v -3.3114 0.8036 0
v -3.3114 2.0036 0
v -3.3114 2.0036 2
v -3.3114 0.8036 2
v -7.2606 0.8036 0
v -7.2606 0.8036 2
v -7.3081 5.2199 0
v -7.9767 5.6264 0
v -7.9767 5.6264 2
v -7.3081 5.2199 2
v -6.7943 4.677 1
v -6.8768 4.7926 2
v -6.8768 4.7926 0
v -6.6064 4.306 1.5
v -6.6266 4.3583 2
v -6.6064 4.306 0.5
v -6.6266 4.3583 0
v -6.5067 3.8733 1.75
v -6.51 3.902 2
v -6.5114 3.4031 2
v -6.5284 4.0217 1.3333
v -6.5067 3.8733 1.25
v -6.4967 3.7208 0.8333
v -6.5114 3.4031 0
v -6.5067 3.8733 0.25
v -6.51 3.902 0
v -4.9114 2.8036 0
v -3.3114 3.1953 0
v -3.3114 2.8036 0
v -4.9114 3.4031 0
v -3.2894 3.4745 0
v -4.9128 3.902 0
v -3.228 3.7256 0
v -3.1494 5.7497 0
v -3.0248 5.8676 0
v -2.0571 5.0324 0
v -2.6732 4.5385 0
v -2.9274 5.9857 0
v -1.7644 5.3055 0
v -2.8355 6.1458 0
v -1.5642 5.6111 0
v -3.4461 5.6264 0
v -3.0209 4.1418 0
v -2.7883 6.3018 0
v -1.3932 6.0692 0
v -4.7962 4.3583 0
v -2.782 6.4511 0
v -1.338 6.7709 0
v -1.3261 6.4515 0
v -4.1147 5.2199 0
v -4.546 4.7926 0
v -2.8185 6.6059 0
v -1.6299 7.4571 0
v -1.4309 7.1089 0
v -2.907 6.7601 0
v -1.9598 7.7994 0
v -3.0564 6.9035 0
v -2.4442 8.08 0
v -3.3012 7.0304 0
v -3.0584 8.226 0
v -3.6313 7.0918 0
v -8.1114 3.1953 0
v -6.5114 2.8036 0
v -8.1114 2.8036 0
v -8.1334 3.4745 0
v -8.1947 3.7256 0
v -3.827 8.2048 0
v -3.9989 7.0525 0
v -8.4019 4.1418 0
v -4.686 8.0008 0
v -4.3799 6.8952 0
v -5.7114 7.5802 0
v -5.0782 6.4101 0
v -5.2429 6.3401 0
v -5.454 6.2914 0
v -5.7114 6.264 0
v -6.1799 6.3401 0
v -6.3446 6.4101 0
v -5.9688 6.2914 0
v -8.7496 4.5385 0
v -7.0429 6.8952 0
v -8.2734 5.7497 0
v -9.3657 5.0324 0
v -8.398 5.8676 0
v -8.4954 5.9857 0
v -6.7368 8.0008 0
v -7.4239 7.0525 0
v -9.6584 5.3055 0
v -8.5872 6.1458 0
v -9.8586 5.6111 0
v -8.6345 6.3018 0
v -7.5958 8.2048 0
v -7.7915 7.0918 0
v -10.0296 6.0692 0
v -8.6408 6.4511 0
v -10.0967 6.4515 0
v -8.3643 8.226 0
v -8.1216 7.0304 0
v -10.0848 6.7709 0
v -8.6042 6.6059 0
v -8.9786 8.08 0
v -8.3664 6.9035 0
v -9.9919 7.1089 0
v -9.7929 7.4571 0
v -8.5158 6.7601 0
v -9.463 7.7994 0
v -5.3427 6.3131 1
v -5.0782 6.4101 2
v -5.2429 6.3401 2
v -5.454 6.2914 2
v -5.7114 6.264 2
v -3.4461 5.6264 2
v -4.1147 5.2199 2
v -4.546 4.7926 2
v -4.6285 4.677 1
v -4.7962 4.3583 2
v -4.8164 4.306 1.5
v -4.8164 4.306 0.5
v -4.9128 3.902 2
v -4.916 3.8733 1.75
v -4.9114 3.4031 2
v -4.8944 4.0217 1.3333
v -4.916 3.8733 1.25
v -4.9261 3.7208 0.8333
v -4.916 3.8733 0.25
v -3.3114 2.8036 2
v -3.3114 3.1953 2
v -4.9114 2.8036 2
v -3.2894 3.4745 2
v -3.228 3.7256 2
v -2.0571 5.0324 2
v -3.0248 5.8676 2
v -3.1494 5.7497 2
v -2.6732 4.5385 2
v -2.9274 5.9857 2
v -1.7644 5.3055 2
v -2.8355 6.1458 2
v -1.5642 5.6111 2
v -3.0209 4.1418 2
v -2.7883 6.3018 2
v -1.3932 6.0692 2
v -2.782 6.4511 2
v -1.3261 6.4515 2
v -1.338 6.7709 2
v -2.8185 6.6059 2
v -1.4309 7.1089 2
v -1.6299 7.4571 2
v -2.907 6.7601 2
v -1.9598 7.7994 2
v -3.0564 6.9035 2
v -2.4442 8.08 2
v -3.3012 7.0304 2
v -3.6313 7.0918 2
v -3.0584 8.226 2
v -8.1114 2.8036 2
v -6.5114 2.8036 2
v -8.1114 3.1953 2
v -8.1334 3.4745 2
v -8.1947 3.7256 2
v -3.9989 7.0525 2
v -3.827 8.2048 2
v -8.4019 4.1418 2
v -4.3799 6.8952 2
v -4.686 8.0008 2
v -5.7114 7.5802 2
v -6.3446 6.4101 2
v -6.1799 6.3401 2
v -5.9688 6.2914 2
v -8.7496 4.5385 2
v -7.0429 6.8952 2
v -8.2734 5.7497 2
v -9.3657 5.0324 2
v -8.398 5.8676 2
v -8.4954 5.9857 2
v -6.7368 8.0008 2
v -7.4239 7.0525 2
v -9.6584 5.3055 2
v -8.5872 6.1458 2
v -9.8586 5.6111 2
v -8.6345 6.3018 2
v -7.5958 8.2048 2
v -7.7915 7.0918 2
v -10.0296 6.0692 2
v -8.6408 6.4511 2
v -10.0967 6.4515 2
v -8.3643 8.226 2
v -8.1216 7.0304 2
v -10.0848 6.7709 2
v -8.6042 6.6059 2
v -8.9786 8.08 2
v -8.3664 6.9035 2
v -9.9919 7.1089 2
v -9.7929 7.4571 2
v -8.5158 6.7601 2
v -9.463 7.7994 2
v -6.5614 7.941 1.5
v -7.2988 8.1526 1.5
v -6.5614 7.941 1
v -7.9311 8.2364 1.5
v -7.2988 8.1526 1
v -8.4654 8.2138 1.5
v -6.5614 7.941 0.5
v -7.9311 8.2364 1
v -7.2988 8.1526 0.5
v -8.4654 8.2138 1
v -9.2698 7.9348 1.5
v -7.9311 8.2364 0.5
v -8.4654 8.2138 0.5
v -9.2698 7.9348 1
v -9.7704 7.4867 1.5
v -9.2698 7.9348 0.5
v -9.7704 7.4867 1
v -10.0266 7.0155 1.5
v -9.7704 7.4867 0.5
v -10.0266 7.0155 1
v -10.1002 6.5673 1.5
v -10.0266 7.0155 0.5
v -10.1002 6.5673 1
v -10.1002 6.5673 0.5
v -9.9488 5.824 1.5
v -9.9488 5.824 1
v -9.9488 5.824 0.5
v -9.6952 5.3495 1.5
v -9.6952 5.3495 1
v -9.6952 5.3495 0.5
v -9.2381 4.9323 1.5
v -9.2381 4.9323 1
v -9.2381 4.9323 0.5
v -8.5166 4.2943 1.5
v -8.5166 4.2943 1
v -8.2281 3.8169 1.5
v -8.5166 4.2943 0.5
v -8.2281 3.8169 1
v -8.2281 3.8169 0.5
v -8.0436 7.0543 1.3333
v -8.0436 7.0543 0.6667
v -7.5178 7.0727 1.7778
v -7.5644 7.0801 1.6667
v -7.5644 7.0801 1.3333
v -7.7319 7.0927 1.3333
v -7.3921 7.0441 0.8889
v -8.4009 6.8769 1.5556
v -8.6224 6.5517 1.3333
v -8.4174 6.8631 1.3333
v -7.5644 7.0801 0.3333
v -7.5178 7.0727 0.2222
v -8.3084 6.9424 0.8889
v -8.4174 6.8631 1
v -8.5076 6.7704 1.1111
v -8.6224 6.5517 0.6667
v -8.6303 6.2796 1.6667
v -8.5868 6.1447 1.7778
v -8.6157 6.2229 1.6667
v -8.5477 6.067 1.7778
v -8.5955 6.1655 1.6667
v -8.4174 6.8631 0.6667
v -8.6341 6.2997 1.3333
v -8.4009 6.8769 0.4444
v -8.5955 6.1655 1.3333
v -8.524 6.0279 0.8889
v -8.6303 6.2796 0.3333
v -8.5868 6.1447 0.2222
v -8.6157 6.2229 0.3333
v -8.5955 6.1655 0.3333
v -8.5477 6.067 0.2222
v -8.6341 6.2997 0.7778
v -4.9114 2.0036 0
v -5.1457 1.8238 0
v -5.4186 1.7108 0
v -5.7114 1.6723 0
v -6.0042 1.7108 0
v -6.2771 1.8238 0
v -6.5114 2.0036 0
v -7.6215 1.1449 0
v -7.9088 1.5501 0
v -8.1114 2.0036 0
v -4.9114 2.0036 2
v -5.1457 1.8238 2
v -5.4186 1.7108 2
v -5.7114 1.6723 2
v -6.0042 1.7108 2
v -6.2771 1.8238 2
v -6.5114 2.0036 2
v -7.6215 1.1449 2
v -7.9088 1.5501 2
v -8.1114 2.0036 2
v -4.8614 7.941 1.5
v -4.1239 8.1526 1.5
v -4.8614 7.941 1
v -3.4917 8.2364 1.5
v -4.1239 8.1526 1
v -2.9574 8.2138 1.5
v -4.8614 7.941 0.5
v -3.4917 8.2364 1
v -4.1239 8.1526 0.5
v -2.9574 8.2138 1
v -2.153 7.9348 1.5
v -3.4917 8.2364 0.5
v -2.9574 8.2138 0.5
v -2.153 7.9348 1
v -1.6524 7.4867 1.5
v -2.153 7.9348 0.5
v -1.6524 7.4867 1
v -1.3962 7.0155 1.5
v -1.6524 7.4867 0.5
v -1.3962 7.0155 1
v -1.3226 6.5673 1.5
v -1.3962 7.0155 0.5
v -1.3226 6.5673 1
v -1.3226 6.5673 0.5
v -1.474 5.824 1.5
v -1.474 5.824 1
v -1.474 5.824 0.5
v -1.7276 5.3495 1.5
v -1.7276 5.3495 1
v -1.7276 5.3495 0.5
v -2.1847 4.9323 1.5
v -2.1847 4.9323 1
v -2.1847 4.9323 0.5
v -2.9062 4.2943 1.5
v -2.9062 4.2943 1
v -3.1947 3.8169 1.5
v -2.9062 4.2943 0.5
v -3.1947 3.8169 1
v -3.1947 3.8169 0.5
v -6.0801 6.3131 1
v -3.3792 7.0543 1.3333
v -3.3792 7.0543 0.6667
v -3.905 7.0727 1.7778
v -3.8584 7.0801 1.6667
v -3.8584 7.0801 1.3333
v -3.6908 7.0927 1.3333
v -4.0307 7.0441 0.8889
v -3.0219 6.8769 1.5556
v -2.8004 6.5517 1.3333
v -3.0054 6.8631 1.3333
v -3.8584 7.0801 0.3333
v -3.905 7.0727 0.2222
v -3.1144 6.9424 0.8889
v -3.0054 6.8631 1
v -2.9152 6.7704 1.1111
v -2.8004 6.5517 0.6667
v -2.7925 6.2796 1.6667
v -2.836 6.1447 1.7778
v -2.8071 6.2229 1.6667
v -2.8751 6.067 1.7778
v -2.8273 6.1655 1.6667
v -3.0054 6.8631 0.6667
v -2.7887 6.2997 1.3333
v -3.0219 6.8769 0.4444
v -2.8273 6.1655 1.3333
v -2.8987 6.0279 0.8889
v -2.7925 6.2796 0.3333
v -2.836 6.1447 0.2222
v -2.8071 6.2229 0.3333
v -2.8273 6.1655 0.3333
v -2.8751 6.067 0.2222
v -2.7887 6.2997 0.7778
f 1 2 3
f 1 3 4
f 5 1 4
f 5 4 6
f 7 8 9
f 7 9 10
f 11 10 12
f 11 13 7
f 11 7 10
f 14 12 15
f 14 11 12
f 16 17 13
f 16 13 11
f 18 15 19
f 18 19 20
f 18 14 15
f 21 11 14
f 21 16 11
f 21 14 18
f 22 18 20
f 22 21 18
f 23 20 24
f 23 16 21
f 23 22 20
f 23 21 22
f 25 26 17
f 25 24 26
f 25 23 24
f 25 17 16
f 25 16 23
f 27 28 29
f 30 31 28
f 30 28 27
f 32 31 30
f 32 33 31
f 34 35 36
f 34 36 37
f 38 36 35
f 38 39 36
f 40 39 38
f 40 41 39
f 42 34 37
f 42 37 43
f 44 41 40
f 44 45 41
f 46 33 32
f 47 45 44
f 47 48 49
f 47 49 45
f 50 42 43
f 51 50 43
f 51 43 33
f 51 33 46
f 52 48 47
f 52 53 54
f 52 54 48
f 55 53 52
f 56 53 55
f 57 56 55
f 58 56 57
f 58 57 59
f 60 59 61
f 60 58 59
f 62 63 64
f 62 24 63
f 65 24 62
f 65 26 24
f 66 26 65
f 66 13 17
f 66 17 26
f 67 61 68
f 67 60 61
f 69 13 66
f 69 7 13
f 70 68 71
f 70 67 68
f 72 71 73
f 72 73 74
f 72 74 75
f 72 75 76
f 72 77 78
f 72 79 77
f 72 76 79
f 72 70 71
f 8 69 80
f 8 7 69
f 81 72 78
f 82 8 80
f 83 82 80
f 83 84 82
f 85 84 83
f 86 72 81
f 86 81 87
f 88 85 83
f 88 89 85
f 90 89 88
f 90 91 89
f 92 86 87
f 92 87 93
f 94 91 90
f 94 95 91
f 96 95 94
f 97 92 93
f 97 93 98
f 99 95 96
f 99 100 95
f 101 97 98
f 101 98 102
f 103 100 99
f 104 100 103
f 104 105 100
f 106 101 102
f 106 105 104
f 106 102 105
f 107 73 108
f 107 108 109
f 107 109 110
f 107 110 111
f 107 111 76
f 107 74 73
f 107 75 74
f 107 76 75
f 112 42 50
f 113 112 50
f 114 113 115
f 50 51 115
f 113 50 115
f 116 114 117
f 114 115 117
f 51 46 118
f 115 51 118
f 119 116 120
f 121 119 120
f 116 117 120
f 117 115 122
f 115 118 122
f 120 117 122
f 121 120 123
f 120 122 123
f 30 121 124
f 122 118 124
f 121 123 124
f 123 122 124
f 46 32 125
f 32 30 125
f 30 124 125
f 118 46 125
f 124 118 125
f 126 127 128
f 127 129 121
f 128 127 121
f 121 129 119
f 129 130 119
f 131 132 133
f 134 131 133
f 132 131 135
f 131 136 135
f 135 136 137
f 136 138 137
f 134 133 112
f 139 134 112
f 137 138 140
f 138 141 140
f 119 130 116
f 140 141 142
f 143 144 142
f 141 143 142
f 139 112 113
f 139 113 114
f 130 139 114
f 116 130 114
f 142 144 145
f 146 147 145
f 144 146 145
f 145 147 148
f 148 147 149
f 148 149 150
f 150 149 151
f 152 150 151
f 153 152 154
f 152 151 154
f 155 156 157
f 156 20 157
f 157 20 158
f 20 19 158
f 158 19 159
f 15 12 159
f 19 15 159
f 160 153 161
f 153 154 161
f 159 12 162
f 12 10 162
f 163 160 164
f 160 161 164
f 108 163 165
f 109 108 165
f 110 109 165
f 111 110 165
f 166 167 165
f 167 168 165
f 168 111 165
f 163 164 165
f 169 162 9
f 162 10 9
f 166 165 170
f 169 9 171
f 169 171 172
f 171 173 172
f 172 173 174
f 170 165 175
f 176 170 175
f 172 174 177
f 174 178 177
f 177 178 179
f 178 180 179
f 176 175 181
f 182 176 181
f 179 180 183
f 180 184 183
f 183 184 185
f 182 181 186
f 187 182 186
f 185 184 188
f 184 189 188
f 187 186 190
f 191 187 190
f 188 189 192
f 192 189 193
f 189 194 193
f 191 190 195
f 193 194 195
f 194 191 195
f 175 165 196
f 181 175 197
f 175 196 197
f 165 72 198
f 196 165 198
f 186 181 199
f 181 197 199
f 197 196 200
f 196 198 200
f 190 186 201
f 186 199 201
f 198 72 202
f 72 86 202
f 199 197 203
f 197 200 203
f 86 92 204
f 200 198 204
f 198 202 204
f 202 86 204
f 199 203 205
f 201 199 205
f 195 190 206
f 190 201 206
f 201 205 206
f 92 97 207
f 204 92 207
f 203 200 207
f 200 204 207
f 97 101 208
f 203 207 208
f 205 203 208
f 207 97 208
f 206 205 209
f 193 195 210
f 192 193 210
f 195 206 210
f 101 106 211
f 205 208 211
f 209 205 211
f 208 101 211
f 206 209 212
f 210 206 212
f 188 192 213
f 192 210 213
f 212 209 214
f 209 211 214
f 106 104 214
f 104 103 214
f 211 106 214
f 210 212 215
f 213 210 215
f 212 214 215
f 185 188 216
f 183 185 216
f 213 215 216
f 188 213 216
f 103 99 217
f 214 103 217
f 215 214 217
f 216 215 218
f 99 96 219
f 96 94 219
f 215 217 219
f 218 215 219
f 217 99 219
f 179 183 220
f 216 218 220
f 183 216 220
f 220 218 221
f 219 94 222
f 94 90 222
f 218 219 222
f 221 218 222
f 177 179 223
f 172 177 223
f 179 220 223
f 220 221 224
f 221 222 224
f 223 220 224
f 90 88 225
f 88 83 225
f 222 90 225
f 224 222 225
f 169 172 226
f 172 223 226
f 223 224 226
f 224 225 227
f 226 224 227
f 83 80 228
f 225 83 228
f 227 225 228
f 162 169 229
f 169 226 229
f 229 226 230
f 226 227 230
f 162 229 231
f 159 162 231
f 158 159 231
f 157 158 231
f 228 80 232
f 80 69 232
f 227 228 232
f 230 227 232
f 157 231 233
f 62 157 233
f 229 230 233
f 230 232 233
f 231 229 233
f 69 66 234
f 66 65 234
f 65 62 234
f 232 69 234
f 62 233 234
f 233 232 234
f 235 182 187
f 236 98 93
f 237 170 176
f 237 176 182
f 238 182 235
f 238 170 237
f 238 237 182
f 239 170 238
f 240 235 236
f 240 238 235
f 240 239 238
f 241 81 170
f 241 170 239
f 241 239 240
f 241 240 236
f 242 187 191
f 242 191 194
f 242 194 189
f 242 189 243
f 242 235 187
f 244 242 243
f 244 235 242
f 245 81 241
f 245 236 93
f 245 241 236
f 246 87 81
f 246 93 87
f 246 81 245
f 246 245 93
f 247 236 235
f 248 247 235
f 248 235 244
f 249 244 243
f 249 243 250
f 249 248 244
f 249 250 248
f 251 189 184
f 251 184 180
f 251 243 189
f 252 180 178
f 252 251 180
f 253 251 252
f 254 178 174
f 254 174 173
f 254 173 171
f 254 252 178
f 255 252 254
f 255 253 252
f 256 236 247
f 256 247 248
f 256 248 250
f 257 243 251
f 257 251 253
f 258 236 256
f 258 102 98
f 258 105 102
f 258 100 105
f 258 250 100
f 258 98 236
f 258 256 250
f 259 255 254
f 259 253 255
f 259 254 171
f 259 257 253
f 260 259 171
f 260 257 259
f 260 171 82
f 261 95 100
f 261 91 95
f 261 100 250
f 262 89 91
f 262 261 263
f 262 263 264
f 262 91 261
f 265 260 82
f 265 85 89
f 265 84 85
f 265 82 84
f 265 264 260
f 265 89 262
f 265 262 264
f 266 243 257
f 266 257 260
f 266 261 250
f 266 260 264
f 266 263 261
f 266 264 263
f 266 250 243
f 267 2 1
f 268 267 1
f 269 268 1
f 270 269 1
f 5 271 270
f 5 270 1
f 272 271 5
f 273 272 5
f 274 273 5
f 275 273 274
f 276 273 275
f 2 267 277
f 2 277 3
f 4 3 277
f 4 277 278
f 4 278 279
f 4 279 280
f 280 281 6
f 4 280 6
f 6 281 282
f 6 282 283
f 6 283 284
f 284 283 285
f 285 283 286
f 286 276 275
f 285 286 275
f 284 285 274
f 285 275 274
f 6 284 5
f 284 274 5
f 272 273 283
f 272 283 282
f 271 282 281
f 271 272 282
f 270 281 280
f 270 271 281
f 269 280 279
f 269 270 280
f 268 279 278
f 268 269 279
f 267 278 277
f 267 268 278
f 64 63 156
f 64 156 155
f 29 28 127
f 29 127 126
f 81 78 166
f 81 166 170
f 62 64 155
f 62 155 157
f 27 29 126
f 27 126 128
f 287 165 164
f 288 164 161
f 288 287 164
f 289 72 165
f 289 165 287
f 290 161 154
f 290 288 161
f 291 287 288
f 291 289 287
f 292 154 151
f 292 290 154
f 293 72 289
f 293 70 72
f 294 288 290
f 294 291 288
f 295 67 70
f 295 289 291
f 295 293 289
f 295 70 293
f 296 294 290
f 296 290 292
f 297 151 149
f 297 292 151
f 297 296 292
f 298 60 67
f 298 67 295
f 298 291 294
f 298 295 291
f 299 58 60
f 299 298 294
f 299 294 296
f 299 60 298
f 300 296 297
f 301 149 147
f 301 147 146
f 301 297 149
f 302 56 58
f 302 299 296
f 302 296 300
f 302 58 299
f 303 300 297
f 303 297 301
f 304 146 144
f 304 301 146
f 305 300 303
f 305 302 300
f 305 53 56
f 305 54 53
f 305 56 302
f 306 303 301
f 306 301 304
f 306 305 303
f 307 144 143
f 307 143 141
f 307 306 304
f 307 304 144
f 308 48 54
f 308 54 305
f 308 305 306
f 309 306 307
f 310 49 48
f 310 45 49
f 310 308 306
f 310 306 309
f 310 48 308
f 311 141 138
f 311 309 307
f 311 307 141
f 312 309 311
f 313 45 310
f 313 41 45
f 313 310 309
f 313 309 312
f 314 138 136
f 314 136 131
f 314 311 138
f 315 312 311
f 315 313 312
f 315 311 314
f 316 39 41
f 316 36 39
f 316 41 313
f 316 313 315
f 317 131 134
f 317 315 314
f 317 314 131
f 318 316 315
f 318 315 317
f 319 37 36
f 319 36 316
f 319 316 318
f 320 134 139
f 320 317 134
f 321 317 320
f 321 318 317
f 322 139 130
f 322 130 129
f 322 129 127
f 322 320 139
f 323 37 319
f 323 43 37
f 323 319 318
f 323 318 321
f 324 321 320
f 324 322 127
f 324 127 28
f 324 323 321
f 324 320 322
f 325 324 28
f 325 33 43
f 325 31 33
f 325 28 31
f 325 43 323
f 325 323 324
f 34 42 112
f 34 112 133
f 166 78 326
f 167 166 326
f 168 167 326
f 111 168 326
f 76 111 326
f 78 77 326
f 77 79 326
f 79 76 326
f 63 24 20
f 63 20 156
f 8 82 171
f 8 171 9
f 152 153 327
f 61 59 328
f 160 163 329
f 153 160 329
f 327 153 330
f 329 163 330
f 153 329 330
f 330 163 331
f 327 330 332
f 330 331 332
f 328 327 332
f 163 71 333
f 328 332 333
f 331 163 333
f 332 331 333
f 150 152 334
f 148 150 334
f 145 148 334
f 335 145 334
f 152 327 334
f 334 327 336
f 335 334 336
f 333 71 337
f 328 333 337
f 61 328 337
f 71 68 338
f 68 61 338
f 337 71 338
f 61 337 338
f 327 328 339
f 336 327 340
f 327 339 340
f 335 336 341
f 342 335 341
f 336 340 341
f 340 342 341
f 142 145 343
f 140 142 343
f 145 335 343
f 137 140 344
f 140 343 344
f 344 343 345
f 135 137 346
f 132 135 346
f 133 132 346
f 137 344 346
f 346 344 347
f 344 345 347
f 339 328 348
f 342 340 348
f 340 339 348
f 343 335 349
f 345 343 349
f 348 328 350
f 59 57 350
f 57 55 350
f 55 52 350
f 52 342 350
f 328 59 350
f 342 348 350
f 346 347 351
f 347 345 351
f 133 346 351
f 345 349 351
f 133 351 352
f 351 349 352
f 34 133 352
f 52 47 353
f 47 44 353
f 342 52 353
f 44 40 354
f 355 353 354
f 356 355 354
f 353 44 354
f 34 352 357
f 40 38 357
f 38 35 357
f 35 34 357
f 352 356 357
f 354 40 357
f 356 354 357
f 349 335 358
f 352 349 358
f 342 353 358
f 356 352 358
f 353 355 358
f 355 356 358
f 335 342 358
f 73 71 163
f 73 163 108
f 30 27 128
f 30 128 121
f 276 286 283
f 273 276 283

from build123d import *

# Parameters (mm, degrees)
EXTRUDE004_DEPTH = 2
EXTRUDE003_DEPTH = 2


with BuildPart() as yext:
    # Sketch007 → Extrude004 (new body)
    with BuildSketch(Plane.XY):
        with BuildLine():
            Line((-6.511396, 2.803628), (-8.111396, 2.803628))
            Line((-8.111396, 2.803628), (-8.111396, 3.195342))
            add(Edge.make_bspline(
                [(-5.711396, 7.580171), (-8.134625, 8.760246), (-10.423908, 7.481657), (-9.936826, 5.594217), (-9.521355, 5.085755), (-8.111396, 4.132973), (-8.111396, 3.195342)],
                knots=[0, 0, 0, 0, 0.25, 0.5, 0.75, 1, 1, 1, 1], degree=3))
            add(Edge.make_bspline(
                [(-5.711396, 7.580171), (-3.288167, 8.760246), (-0.998884, 7.481657), (-1.485966, 5.594217), (-1.901437, 5.085755), (-3.311396, 4.132973), (-3.311396, 3.195342)],
                knots=[0, 0, 0, 0, 0.25, 0.5, 0.75, 1, 1, 1, 1], degree=3))
            Line((-3.311396, 3.195342), (-3.311396, 2.803628))
            Line((-3.311396, 2.803628), (-4.911396, 2.803628))
            Line((-4.911396, 2.803628), (-4.911396, 3.40307))
            add(Edge.make_bspline(
                [(-3.446122, 5.626382), (-5.078191, 4.839241), (-4.911396, 3.40307)],
                knots=[0, 0, 0, 1, 1, 1], degree=2))
            Line((-3.446122, 5.626382), (-3.149386, 5.749731))
            add(Edge.make_bspline(
                [(-4.379856, 6.895151), (-3.336875, 7.506011), (-2.16788, 6.580557), (-3.149386, 5.749731)],
                knots=[0, 0, 0, 0, 1, 1, 1, 1], degree=3))
            Line((-4.379856, 6.895151), (-5.078191, 6.410078))
            add(Edge.make_bspline(
                [(-5.078191, 6.410078), (-5.290526, 6.289091), (-5.711396, 6.263954)],
                knots=[0, 0, 0, 1, 1, 1], degree=2))
            add(Edge.make_bspline(
                [(-6.344601, 6.410078), (-6.132266, 6.289091), (-5.711396, 6.263954)],
                knots=[0, 0, 0, 1, 1, 1], degree=2))
            Line((-6.344601, 6.410078), (-7.042936, 6.895151))
            add(Edge.make_bspline(
                [(-7.042936, 6.895151), (-8.085917, 7.506011), (-9.254912, 6.580557), (-8.273406, 5.749731)],
                knots=[0, 0, 0, 0, 1, 1, 1, 1], degree=3))
            Line((-8.273406, 5.749731), (-7.97667, 5.626382))
            add(Edge.make_bspline(
                [(-7.97667, 5.626382), (-6.344601, 4.839241), (-6.511396, 3.40307)],
                knots=[0, 0, 0, 1, 1, 1], degree=2))
            Line((-6.511396, 3.40307), (-6.511396, 2.803628))
        make_face()
    extrude(amount=EXTRUDE004_DEPTH)


with BuildPart() as ylogoext:
    # Sketch005 → Extrude003 (new body)
    with BuildSketch(Plane.XY):
        with BuildLine():
            Line((-8.111396, 2.003628), (-6.511396, 2.003628))
            ThreePointArc((-6.511396, 2.003628), (-5.711396, 1.672257), (-4.911396, 2.003628))
            Line((-4.911396, 2.003628), (-3.311396, 2.003628))
            Line((-3.311396, 2.003628), (-3.311396, 0.803628))
            Line((-3.311396, 0.803628), (-7.260589, 0.803628))
            ThreePointArc((-8.111396, 2.003628), (-7.775138, 1.340423), (-7.260589, 0.803628))
        make_face()
    extrude(amount=EXTRUDE003_DEPTH)

    # Fusion001: union YExt
    add(yext.part)


solid = ylogoext.part
